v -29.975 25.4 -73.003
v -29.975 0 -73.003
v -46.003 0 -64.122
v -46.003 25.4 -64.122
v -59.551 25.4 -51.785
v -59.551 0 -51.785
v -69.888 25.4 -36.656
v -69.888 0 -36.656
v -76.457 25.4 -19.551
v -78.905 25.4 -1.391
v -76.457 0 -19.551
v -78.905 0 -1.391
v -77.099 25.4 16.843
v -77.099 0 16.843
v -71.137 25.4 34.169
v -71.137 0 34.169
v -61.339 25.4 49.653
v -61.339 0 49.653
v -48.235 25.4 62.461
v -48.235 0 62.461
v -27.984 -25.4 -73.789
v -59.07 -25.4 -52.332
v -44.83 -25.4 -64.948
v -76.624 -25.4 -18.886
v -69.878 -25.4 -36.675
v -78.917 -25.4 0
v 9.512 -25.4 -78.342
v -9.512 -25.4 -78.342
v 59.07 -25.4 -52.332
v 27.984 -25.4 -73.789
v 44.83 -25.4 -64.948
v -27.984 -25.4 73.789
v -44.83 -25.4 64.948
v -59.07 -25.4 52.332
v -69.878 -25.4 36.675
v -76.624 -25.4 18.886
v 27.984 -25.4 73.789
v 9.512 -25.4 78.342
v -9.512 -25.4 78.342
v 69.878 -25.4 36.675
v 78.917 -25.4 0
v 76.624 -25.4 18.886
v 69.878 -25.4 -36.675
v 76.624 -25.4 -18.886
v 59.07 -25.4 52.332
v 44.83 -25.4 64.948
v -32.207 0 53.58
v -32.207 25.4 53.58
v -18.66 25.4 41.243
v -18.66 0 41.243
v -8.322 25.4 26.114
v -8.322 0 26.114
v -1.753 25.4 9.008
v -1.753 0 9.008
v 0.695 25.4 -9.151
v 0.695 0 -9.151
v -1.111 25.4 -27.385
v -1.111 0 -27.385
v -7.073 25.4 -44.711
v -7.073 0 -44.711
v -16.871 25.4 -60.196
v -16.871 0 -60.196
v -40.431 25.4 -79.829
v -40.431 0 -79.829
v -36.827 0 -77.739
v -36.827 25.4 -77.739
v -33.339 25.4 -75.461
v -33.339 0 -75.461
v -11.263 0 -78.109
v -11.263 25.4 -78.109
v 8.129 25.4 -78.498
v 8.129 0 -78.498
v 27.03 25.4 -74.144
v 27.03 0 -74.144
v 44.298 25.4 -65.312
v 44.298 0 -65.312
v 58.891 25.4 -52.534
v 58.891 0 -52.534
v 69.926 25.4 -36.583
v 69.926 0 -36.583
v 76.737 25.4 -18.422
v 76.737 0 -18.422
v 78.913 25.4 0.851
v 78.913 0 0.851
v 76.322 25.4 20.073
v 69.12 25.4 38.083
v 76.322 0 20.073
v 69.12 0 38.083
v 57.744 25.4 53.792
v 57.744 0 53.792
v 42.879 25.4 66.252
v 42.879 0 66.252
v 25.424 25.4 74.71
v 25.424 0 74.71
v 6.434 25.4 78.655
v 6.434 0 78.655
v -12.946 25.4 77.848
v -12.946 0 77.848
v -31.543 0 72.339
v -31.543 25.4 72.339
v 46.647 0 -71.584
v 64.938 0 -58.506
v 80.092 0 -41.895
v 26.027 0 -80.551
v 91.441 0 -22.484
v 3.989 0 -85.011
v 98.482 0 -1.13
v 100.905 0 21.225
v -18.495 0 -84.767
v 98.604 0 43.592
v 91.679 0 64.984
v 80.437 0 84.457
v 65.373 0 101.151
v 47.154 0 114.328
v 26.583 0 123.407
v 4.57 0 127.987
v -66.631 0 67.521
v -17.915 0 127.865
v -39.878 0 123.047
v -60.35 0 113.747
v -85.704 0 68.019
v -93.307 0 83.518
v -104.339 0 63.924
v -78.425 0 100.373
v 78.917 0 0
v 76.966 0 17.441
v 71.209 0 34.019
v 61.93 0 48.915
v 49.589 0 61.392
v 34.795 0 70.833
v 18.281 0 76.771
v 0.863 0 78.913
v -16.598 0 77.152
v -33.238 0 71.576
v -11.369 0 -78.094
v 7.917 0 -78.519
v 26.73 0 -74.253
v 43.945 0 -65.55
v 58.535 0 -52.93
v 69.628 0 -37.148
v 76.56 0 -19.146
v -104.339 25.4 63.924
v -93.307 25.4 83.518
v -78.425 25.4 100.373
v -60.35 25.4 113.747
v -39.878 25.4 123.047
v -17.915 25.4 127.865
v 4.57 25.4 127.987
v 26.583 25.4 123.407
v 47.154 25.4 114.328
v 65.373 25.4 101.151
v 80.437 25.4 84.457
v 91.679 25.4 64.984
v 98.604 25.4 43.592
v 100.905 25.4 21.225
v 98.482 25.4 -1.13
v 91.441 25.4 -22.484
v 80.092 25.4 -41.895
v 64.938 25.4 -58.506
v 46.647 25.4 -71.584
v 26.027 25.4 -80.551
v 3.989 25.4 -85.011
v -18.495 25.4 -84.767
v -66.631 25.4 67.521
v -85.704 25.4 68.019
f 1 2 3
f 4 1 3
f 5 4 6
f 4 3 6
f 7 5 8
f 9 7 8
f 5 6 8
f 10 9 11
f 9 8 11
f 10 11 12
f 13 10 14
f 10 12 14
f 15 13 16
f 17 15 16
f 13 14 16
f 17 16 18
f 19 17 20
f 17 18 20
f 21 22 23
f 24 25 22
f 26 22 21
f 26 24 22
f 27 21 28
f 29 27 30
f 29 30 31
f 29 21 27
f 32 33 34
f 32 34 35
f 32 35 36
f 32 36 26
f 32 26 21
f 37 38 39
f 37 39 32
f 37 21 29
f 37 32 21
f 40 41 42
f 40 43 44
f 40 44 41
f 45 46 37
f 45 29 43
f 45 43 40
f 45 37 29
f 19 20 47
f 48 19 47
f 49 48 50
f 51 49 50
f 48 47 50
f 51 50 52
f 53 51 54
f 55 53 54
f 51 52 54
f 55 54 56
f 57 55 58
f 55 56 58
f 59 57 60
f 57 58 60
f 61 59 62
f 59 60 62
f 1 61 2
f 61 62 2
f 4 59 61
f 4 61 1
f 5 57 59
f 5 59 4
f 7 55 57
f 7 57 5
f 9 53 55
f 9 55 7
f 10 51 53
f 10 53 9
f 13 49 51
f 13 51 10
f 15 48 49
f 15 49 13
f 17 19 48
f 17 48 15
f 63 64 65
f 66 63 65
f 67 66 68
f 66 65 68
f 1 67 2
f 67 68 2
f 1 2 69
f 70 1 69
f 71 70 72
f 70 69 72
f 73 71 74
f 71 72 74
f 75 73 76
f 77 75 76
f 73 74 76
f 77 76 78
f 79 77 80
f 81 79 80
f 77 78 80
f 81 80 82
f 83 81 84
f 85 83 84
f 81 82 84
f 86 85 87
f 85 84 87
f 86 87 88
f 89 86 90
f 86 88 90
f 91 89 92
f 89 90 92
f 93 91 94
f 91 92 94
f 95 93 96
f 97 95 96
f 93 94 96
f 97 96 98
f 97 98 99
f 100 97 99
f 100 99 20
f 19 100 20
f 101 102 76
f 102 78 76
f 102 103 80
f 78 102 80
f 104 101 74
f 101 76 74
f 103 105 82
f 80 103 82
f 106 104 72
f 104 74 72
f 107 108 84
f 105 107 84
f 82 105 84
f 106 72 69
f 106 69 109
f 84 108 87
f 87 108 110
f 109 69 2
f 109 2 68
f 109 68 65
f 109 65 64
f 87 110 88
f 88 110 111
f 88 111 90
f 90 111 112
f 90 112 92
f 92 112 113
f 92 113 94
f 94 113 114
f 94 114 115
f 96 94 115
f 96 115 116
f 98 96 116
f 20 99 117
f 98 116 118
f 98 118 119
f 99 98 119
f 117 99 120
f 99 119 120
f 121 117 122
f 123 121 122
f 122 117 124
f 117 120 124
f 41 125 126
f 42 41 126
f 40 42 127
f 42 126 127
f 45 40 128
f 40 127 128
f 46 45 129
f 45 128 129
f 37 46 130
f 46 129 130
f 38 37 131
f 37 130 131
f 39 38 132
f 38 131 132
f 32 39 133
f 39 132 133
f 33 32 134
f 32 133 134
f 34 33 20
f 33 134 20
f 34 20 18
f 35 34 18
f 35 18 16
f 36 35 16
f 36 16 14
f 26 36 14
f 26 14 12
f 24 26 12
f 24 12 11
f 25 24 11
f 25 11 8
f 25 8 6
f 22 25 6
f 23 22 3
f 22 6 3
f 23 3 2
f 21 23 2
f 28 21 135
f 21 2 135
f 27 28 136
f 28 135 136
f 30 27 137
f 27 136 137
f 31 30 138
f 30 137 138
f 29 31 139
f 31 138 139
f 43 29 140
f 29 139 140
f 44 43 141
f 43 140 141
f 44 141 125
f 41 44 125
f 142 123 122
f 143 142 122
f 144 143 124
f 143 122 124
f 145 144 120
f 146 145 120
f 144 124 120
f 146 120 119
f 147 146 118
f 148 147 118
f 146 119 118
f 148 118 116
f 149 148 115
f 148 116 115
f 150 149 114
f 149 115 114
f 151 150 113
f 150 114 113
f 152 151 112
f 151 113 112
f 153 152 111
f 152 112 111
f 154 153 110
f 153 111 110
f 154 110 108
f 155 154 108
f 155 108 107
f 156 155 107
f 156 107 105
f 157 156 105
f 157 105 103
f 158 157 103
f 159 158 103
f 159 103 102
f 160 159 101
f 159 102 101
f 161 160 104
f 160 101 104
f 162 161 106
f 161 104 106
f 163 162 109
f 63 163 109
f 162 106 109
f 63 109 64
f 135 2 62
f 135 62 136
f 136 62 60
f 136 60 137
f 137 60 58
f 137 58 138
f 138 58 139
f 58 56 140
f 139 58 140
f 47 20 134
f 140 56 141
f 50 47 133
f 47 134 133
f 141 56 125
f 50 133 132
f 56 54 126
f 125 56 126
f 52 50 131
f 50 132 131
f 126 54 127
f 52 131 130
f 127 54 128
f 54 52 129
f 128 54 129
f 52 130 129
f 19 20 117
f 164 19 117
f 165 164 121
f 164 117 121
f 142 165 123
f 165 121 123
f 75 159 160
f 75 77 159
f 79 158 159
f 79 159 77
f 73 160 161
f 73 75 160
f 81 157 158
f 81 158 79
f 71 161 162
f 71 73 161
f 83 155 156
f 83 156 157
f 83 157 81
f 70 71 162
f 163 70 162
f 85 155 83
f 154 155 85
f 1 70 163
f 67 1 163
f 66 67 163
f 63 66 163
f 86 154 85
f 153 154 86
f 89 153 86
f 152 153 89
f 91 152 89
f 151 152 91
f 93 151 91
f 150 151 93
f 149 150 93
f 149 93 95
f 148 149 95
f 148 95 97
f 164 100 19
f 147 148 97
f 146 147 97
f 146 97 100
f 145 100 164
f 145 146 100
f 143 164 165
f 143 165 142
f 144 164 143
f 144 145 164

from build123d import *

# Parameters (mm, degrees)
F0_R     = 78.9173451656
F1_DEPTH = 25.4
F3_DEPTH = 25.4


# Not quite as in the source:
# - after a boolean that leaves OpenCascade's solid faulty, fix() repairs it


with BuildPart() as f1:
    # F0 (on Front) → F1 (new body)
    with BuildSketch(Plane.XZ):
        Circle(F0_R)
    extrude(amount=F1_DEPTH)

    # F2 (on face) → F3 (join)
    with BuildSketch(Plane(origin=(0, 0, 0), x_dir=(-1, 0, 0), z_dir=(0, 1, 0))):
        with BuildLine():
            ThreePointArc((78.9173451656, 0), (70.8325817016, 34.7950102381), (48.2347940755, 62.460803777))
            ThreePointArc((48.2347940755, 62.460803777), (0, 0), (29.975245774, -73.0029589042))
            ThreePointArc((29.975245774, -73.0029589042), (65.5496536419, -43.9453100502), (78.9173451656, 0))
        make_face()
    extrude(amount=F3_DEPTH)

    add(f1.part.fix(), mode=Mode.REPLACE)


with BuildPart() as f3:
    # F2 (on face) → F3, piece 2 (new body)
    with BuildSketch(Plane(origin=(0, 0, 0), x_dir=(-1, 0, 0), z_dir=(0, 1, 0))):
        with BuildLine():
            ThreePointArc((48.2347940755, 62.460803777), (76.1521808182, 68.348354975), (104.3385465947, 63.924270215))
            ThreePointArc((104.3385465947, 63.924270215), (-91.6791379898, 64.9839546859), (40.4312930076, -79.8293376001))
            ThreePointArc((40.4312930076, -79.8293376001), (35.0680398169, -76.6232810344), (29.975245774, -73.0029589042))
            ThreePointArc((29.975245774, -73.0029589042), (-78.2100398495, 10.5421551272), (48.2347940755, 62.460803777))
        make_face()
    extrude(amount=F3_DEPTH)


solid = Compound([f1.part, f3.part])
